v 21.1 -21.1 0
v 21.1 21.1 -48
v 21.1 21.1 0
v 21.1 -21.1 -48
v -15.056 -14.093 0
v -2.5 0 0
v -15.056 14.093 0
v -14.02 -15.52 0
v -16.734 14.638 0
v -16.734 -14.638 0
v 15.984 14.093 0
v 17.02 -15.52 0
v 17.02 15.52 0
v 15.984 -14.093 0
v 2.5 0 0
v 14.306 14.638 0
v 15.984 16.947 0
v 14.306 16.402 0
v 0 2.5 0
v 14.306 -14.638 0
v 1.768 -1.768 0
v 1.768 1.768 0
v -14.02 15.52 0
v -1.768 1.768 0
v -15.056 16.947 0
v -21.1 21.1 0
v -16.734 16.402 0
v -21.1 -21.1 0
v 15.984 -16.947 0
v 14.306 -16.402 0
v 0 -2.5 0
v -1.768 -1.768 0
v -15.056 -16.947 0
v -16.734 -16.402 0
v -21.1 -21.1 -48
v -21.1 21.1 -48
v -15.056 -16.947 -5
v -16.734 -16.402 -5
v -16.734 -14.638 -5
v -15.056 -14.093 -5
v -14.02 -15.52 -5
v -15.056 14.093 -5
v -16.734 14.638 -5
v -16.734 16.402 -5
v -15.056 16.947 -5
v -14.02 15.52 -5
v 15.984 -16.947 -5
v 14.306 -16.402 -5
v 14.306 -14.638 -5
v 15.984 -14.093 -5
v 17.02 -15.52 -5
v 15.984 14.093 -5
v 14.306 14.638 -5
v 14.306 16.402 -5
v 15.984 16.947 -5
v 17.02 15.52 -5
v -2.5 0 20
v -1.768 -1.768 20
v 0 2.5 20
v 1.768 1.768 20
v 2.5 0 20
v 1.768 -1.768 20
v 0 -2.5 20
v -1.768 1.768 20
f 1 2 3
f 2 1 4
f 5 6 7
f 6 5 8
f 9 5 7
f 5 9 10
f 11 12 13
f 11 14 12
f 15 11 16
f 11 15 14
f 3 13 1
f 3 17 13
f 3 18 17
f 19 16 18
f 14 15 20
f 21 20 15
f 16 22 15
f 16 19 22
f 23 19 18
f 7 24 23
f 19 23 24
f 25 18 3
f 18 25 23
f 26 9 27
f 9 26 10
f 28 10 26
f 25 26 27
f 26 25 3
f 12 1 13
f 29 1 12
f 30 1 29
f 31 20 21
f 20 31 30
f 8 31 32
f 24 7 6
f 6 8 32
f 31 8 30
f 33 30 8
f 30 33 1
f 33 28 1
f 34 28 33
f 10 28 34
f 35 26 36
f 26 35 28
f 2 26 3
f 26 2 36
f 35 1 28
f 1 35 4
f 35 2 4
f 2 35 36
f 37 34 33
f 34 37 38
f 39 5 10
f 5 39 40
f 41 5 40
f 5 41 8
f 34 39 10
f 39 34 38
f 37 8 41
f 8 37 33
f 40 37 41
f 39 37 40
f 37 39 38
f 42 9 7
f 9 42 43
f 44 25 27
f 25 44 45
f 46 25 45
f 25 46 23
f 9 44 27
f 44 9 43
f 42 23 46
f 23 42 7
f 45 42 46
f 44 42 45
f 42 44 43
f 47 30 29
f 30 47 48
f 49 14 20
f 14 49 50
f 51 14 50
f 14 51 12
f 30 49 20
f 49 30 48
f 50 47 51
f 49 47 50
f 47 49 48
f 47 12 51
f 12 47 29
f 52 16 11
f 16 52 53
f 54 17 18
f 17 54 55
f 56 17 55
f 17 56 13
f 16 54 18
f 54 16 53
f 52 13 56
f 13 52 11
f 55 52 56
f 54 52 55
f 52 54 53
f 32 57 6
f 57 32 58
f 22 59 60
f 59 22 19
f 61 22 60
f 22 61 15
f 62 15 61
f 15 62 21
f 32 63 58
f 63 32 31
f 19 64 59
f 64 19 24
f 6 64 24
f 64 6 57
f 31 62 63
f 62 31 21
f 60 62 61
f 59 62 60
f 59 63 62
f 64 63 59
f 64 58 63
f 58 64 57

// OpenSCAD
// file: ../machine.scad
/*
 * Helpers for machinging; i.e. kerf alowances
 *
 * Copyright 2013 <b@Zi.iS>
 * License CC BY 3.0
 */

include <main.scad>;

ZCUT = 0;
XOFF = 0;
YOFF = 0;

module drawing() {
	//create blueprint
	if(preview==0) {
		projection(cut=true) translate([
			XOFF,
			YOFF,
			ZCUT
		]) {
			for(i=[0:$children-1]) child(i);
		}
	} else {
		for(i=[0:$children-1]) child(i);
	}
}

module kerf_cube(
	size
) {
	translate([
		kerf/2*(1-preview),
		kerf/2*(1-preview),
		0
	]) {
		cube([
			size[0] - kerf*(1-preview),
			size[1] - kerf*(1-preview),
			size[2]
		]);
	}
}

module kerf_cylinder(
	r,
	h
) {
	cylinder(
		r = r - kerf/2*(1-preview),
		h = h
	);
}

module part(
	id,
	name
) {
	if(PART<1 || PART==id) {
		echo(str("PART", id, ":", name));
		for(i=[0:$children-1]) child(i);
	}	
}
// file: ../easing.scad
/*
 * Make allowances to ensure good fit.
 *
 * Copyright 2013 <b@Zi.iS>
 * License CC BY 3.0
 */

function ease(value) = min(value*1.1, value + .2);
// file: ../epslion.scad
/*
 * Slightly offset previews to overcome rounding issues
 *
 * Copyright 2013 <b@Zi.iS>
 * License CC BY 3.0
 */

include <config.scad>;

module e(
	shift = -.1,
	size = 1.1
) {
	if(preview == 1) {
		translate([
			0,
			0,
			shift
		]) {
			scale([
				1,
				1,
				size
			]) {
				if($children>0) for (i = [0 : $children-1]) child(i);
			}
		}
	} else {
		if($children>0) for (i = [0 : $children-1]) child(i);
	}
}
// file: ../config.scad
/*
 * Default settings
 *
 * Copyright 2013 <b@Zi.iS>
 * License CC BY 3.0
 */

preview = 1;
$fa = 6;
$fs = 2 - 1.5*(1-preview);
kerf = .2;
PART = 0; //all

// preview colors
color_steel = [.8, .8, .8];
color_wood = [.3, .3, 0];
color_print = [0, .8, 0];
color_plastic = [.7, 1, .7];
color_brass = [181/255, 166/255, 66/255];
// file: ../main.scad
/*
 * A library to make SCAD easier.
 *
 * Copyright 2013 <b@Zi.iS>
 * License CC BY 3.0
 */

include <config.scad>;
use <epslion.scad>;
use <easing.scad>;
use <machine.scad>;
// main file
/*
 * NEMA Motors
 *
 * Copyright 2013 <b@Zi.iS>
 * License CC BY 3.0
 */

include <../main.scad>;

nema();

nema_sizes = [
	[],
	[],
	[],
	[],
	[],
	[],
	[],
	[],
	[],
	[],
	[],
	[],
	[],
	[],
	[],
	[],
	[],
	[42.2, 31.04, 3]
];

function nema_faceplate(size) = [nema_sizes[size][0], nema_sizes[size][0]];

module nema_faceplate_drill(
	motor
) {
	for(x=[0:1]) {
		for(y=[0:1]) {
			translate([
				-nema_sizes[motor[0]][1]/2 + nema_sizes[motor[0]][1]*x,
				-nema_sizes[motor[0]][1]/2 + nema_sizes[motor[0]][1]*y,
				0
			]) {
				kerf_cylinder(
					r = nema_sizes[motor[0]][2]/2,
					h = 1000
				);
			}	
		}
	}
	kerf_cylinder(
		r = motor[2]/2 + 1,
		h = 1000
	);
}

module nema(
    motor = [
        17, //Size
        20, //Shaft length
        5   //Shaft diamiter
    ],
	depth = 48,
	id
) {
	part(id, str("NEMA", motor[0], " ", depth,"mm long with ", motor[1], "x", motor[2], "mm shaft")) {	
		color(color_steel) cylinder(
			r = motor[2]/2,
			h = motor[1]
		);
		difference() {
			union() {
				color(color_steel) translate([
					-nema_sizes[motor[0]][0]/2,
					-nema_sizes[motor[0]][0]/2,
					-5
				]) {
					cube([
						nema_sizes[motor[0]][0],
						nema_sizes[motor[0]][0],
						5
					]);
				}
				color([0,0,0]) translate([
					-nema_sizes[motor[0]][0]/2,
					-nema_sizes[motor[0]][0]/2,
					-depth
				]) {
					cube([
						nema_sizes[motor[0]][0],
						nema_sizes[motor[0]][0],
						depth-5
					]);
				}
			}
			for(x=[0:1]) {
				for(y=[0:1]) {
					translate([
						-nema_sizes[motor[0]][1]/2 + nema_sizes[motor[0]][1]*x,
						-nema_sizes[motor[0]][1]/2 + nema_sizes[motor[0]][1]*y,
						-5
					]) {
						cylinder(
							r = nema_sizes[motor[0]][2]/2,
							h = 6
						);
					}
				}
			}
		}
	}
	translate([
		0,
		0,
		motor[1]
	] * preview) {
		if($children>0) for (i = [0 : $children-1]) child(i);
	}
}
